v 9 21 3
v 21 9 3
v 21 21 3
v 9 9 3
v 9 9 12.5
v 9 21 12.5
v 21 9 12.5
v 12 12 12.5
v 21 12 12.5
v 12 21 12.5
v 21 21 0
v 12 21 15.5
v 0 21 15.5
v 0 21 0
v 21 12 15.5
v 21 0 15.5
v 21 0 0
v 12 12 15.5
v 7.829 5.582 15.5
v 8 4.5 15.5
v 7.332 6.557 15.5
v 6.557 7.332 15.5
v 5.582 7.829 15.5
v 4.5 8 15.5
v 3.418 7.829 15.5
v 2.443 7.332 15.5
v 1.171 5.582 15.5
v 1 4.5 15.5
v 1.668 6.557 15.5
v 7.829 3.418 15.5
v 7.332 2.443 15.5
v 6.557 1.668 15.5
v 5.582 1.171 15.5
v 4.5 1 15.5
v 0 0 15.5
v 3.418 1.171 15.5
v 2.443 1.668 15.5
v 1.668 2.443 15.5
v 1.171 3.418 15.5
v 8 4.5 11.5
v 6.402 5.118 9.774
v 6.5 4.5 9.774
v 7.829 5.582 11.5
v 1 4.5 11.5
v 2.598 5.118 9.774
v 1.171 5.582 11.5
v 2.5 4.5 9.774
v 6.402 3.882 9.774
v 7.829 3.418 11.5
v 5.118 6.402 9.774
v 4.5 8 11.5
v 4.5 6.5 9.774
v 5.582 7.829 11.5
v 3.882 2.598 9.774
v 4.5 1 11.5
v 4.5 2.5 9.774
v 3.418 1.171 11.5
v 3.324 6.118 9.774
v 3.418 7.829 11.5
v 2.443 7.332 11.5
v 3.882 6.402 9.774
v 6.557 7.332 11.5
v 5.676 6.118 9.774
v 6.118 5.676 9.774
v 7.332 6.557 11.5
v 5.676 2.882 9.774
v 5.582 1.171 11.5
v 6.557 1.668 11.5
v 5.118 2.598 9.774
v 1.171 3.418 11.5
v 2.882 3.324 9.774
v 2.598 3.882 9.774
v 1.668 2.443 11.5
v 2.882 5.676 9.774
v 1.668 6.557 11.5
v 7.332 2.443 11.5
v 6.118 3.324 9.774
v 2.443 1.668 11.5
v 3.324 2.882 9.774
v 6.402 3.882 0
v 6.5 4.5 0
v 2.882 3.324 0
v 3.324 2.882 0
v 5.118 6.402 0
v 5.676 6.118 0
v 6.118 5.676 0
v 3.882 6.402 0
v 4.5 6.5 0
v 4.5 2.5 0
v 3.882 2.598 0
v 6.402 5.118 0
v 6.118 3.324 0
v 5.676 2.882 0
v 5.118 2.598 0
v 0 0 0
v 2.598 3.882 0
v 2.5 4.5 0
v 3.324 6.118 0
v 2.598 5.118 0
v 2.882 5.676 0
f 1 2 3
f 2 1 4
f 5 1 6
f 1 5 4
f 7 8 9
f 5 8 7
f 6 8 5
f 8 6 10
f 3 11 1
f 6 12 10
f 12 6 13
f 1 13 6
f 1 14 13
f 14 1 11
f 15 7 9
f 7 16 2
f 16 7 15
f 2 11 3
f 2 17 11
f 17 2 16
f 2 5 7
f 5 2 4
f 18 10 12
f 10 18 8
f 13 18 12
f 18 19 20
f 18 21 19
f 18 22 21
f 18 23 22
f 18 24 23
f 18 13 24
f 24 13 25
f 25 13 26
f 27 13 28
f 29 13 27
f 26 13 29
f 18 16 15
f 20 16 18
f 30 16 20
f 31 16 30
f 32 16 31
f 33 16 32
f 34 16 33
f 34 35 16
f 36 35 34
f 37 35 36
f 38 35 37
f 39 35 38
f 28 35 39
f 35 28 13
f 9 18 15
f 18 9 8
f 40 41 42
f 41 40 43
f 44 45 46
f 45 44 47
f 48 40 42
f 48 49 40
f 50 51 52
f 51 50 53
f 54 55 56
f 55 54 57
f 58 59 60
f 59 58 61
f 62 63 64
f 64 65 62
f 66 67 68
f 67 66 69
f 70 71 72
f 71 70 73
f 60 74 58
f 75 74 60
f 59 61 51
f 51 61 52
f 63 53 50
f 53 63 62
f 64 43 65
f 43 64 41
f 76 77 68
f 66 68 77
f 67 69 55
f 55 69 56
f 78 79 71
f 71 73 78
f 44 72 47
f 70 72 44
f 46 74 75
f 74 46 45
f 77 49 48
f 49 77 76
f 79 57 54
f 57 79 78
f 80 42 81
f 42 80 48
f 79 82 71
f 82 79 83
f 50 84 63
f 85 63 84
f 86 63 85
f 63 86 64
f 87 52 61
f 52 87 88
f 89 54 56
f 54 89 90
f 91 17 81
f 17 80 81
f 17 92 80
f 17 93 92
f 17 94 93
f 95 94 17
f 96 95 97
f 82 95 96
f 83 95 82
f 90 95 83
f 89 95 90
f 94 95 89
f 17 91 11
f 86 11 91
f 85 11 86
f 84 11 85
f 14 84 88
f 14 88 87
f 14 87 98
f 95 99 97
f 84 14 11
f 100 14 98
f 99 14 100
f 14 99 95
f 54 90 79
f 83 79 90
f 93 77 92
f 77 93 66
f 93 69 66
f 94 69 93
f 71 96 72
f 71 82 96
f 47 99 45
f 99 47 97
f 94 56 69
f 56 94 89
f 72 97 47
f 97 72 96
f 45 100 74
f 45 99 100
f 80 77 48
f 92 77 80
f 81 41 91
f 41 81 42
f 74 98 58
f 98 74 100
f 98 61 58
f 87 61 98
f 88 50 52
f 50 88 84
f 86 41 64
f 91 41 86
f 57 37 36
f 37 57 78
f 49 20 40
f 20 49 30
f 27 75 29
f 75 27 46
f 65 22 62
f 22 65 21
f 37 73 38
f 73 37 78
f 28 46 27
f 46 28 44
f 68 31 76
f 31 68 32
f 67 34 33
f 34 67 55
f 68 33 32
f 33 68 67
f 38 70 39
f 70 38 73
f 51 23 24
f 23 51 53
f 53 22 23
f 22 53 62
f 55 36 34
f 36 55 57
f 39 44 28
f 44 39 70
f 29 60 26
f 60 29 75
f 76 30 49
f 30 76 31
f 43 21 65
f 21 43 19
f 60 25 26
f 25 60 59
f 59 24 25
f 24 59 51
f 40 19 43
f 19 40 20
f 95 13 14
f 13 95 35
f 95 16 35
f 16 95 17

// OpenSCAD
// Corner Bracket
// by Nathan Wittstock <nate@fardog.io>

// preview[view: south east, tilt: top diagonal]

/* [Object] */
object_depth_mm = 9.5;
object_front_overlap_mm = 3;
object_rear_overlap_mm = 12;

/* [Screw] */
screw_d_mm = 4;
screw_inset_head = true;
screw_additional_inset = 4;
screw_head_angle = 82;
screw_head_mm = 7;

/* [Bracket] */
thickness_mm = 3;
screw_offset_r_mm = 1;

/* [Hidden] */
total_depth = object_depth_mm + thickness_mm * 2;
total_side = screw_head_mm + screw_offset_r_mm * 2 + object_rear_overlap_mm;
object_offset = total_side - object_rear_overlap_mm;
front_offset = object_offset + object_front_overlap_mm;
front_size = total_side - front_offset;
screw_center = screw_head_mm / 2 + screw_offset_r_mm;
screw_top = total_depth - screw_additional_inset;

module cone(r, angle, invert=false) {
    h = tan((180 - angle) / 2) * r;
    translate([0, 0, -h]) {
        if (invert) {
                cylinder(r1=r,r2=0,h=h, $fn=20); 
        } else {
            cylinder(r1=0,r2=r,h=h, $fn=20); 
        }
    }
}

module screw(r, d, l, head, head_d, cap, angle, $fn=20) {
    radius = r > 0 ? r : d / 2;
    head_r = head > 0 ? head : head_d / 2;

    union() {
        if (angle) {
            translate([0, 0, l])
                cone(head_r, angle, false);
        }
        linear_extrude(l)
            circle(r=radius);
        if (cap > 0) {
            translate([0, 0, l - cap])
                linear_extrude(cap)
                    circle(r=head_r);
        }
    }
}

module inset_screw(r, d, l, head, head_d, cap, angle, inset, $fn=20) {
    screw_height = l - inset;
    head_r = head > 0 ? head : head_d / 2;

    union() {
        screw(
            r=r,
            d=d,
            l=screw_height,
            head=head_r,
            cap=cap,
            angle=angle,
            $fn=$fn
        );
        translate([0, 0, screw_height])
            linear_extrude(inset)
                circle(r=head_r);
    }
}

difference() {
    // body
    linear_extrude(total_depth)
        square(total_side);
    // object cutout
    translate([object_offset, object_offset, thickness_mm])
        union() {
            // main cutout
            linear_extrude(object_depth_mm)
                square(object_rear_overlap_mm);
            // front cutout
            translate([object_front_overlap_mm, object_front_overlap_mm, object_depth_mm])
                linear_extrude(thickness_mm)
                    square(object_rear_overlap_mm - object_front_overlap_mm);
        }
    // screw hole
    translate([screw_center, screw_center, 0])
        inset_screw(
            d=screw_d_mm,
            l=total_depth,
            head_d=screw_head_mm,
            angle=screw_head_angle,
            inset=screw_additional_inset
        );
}
